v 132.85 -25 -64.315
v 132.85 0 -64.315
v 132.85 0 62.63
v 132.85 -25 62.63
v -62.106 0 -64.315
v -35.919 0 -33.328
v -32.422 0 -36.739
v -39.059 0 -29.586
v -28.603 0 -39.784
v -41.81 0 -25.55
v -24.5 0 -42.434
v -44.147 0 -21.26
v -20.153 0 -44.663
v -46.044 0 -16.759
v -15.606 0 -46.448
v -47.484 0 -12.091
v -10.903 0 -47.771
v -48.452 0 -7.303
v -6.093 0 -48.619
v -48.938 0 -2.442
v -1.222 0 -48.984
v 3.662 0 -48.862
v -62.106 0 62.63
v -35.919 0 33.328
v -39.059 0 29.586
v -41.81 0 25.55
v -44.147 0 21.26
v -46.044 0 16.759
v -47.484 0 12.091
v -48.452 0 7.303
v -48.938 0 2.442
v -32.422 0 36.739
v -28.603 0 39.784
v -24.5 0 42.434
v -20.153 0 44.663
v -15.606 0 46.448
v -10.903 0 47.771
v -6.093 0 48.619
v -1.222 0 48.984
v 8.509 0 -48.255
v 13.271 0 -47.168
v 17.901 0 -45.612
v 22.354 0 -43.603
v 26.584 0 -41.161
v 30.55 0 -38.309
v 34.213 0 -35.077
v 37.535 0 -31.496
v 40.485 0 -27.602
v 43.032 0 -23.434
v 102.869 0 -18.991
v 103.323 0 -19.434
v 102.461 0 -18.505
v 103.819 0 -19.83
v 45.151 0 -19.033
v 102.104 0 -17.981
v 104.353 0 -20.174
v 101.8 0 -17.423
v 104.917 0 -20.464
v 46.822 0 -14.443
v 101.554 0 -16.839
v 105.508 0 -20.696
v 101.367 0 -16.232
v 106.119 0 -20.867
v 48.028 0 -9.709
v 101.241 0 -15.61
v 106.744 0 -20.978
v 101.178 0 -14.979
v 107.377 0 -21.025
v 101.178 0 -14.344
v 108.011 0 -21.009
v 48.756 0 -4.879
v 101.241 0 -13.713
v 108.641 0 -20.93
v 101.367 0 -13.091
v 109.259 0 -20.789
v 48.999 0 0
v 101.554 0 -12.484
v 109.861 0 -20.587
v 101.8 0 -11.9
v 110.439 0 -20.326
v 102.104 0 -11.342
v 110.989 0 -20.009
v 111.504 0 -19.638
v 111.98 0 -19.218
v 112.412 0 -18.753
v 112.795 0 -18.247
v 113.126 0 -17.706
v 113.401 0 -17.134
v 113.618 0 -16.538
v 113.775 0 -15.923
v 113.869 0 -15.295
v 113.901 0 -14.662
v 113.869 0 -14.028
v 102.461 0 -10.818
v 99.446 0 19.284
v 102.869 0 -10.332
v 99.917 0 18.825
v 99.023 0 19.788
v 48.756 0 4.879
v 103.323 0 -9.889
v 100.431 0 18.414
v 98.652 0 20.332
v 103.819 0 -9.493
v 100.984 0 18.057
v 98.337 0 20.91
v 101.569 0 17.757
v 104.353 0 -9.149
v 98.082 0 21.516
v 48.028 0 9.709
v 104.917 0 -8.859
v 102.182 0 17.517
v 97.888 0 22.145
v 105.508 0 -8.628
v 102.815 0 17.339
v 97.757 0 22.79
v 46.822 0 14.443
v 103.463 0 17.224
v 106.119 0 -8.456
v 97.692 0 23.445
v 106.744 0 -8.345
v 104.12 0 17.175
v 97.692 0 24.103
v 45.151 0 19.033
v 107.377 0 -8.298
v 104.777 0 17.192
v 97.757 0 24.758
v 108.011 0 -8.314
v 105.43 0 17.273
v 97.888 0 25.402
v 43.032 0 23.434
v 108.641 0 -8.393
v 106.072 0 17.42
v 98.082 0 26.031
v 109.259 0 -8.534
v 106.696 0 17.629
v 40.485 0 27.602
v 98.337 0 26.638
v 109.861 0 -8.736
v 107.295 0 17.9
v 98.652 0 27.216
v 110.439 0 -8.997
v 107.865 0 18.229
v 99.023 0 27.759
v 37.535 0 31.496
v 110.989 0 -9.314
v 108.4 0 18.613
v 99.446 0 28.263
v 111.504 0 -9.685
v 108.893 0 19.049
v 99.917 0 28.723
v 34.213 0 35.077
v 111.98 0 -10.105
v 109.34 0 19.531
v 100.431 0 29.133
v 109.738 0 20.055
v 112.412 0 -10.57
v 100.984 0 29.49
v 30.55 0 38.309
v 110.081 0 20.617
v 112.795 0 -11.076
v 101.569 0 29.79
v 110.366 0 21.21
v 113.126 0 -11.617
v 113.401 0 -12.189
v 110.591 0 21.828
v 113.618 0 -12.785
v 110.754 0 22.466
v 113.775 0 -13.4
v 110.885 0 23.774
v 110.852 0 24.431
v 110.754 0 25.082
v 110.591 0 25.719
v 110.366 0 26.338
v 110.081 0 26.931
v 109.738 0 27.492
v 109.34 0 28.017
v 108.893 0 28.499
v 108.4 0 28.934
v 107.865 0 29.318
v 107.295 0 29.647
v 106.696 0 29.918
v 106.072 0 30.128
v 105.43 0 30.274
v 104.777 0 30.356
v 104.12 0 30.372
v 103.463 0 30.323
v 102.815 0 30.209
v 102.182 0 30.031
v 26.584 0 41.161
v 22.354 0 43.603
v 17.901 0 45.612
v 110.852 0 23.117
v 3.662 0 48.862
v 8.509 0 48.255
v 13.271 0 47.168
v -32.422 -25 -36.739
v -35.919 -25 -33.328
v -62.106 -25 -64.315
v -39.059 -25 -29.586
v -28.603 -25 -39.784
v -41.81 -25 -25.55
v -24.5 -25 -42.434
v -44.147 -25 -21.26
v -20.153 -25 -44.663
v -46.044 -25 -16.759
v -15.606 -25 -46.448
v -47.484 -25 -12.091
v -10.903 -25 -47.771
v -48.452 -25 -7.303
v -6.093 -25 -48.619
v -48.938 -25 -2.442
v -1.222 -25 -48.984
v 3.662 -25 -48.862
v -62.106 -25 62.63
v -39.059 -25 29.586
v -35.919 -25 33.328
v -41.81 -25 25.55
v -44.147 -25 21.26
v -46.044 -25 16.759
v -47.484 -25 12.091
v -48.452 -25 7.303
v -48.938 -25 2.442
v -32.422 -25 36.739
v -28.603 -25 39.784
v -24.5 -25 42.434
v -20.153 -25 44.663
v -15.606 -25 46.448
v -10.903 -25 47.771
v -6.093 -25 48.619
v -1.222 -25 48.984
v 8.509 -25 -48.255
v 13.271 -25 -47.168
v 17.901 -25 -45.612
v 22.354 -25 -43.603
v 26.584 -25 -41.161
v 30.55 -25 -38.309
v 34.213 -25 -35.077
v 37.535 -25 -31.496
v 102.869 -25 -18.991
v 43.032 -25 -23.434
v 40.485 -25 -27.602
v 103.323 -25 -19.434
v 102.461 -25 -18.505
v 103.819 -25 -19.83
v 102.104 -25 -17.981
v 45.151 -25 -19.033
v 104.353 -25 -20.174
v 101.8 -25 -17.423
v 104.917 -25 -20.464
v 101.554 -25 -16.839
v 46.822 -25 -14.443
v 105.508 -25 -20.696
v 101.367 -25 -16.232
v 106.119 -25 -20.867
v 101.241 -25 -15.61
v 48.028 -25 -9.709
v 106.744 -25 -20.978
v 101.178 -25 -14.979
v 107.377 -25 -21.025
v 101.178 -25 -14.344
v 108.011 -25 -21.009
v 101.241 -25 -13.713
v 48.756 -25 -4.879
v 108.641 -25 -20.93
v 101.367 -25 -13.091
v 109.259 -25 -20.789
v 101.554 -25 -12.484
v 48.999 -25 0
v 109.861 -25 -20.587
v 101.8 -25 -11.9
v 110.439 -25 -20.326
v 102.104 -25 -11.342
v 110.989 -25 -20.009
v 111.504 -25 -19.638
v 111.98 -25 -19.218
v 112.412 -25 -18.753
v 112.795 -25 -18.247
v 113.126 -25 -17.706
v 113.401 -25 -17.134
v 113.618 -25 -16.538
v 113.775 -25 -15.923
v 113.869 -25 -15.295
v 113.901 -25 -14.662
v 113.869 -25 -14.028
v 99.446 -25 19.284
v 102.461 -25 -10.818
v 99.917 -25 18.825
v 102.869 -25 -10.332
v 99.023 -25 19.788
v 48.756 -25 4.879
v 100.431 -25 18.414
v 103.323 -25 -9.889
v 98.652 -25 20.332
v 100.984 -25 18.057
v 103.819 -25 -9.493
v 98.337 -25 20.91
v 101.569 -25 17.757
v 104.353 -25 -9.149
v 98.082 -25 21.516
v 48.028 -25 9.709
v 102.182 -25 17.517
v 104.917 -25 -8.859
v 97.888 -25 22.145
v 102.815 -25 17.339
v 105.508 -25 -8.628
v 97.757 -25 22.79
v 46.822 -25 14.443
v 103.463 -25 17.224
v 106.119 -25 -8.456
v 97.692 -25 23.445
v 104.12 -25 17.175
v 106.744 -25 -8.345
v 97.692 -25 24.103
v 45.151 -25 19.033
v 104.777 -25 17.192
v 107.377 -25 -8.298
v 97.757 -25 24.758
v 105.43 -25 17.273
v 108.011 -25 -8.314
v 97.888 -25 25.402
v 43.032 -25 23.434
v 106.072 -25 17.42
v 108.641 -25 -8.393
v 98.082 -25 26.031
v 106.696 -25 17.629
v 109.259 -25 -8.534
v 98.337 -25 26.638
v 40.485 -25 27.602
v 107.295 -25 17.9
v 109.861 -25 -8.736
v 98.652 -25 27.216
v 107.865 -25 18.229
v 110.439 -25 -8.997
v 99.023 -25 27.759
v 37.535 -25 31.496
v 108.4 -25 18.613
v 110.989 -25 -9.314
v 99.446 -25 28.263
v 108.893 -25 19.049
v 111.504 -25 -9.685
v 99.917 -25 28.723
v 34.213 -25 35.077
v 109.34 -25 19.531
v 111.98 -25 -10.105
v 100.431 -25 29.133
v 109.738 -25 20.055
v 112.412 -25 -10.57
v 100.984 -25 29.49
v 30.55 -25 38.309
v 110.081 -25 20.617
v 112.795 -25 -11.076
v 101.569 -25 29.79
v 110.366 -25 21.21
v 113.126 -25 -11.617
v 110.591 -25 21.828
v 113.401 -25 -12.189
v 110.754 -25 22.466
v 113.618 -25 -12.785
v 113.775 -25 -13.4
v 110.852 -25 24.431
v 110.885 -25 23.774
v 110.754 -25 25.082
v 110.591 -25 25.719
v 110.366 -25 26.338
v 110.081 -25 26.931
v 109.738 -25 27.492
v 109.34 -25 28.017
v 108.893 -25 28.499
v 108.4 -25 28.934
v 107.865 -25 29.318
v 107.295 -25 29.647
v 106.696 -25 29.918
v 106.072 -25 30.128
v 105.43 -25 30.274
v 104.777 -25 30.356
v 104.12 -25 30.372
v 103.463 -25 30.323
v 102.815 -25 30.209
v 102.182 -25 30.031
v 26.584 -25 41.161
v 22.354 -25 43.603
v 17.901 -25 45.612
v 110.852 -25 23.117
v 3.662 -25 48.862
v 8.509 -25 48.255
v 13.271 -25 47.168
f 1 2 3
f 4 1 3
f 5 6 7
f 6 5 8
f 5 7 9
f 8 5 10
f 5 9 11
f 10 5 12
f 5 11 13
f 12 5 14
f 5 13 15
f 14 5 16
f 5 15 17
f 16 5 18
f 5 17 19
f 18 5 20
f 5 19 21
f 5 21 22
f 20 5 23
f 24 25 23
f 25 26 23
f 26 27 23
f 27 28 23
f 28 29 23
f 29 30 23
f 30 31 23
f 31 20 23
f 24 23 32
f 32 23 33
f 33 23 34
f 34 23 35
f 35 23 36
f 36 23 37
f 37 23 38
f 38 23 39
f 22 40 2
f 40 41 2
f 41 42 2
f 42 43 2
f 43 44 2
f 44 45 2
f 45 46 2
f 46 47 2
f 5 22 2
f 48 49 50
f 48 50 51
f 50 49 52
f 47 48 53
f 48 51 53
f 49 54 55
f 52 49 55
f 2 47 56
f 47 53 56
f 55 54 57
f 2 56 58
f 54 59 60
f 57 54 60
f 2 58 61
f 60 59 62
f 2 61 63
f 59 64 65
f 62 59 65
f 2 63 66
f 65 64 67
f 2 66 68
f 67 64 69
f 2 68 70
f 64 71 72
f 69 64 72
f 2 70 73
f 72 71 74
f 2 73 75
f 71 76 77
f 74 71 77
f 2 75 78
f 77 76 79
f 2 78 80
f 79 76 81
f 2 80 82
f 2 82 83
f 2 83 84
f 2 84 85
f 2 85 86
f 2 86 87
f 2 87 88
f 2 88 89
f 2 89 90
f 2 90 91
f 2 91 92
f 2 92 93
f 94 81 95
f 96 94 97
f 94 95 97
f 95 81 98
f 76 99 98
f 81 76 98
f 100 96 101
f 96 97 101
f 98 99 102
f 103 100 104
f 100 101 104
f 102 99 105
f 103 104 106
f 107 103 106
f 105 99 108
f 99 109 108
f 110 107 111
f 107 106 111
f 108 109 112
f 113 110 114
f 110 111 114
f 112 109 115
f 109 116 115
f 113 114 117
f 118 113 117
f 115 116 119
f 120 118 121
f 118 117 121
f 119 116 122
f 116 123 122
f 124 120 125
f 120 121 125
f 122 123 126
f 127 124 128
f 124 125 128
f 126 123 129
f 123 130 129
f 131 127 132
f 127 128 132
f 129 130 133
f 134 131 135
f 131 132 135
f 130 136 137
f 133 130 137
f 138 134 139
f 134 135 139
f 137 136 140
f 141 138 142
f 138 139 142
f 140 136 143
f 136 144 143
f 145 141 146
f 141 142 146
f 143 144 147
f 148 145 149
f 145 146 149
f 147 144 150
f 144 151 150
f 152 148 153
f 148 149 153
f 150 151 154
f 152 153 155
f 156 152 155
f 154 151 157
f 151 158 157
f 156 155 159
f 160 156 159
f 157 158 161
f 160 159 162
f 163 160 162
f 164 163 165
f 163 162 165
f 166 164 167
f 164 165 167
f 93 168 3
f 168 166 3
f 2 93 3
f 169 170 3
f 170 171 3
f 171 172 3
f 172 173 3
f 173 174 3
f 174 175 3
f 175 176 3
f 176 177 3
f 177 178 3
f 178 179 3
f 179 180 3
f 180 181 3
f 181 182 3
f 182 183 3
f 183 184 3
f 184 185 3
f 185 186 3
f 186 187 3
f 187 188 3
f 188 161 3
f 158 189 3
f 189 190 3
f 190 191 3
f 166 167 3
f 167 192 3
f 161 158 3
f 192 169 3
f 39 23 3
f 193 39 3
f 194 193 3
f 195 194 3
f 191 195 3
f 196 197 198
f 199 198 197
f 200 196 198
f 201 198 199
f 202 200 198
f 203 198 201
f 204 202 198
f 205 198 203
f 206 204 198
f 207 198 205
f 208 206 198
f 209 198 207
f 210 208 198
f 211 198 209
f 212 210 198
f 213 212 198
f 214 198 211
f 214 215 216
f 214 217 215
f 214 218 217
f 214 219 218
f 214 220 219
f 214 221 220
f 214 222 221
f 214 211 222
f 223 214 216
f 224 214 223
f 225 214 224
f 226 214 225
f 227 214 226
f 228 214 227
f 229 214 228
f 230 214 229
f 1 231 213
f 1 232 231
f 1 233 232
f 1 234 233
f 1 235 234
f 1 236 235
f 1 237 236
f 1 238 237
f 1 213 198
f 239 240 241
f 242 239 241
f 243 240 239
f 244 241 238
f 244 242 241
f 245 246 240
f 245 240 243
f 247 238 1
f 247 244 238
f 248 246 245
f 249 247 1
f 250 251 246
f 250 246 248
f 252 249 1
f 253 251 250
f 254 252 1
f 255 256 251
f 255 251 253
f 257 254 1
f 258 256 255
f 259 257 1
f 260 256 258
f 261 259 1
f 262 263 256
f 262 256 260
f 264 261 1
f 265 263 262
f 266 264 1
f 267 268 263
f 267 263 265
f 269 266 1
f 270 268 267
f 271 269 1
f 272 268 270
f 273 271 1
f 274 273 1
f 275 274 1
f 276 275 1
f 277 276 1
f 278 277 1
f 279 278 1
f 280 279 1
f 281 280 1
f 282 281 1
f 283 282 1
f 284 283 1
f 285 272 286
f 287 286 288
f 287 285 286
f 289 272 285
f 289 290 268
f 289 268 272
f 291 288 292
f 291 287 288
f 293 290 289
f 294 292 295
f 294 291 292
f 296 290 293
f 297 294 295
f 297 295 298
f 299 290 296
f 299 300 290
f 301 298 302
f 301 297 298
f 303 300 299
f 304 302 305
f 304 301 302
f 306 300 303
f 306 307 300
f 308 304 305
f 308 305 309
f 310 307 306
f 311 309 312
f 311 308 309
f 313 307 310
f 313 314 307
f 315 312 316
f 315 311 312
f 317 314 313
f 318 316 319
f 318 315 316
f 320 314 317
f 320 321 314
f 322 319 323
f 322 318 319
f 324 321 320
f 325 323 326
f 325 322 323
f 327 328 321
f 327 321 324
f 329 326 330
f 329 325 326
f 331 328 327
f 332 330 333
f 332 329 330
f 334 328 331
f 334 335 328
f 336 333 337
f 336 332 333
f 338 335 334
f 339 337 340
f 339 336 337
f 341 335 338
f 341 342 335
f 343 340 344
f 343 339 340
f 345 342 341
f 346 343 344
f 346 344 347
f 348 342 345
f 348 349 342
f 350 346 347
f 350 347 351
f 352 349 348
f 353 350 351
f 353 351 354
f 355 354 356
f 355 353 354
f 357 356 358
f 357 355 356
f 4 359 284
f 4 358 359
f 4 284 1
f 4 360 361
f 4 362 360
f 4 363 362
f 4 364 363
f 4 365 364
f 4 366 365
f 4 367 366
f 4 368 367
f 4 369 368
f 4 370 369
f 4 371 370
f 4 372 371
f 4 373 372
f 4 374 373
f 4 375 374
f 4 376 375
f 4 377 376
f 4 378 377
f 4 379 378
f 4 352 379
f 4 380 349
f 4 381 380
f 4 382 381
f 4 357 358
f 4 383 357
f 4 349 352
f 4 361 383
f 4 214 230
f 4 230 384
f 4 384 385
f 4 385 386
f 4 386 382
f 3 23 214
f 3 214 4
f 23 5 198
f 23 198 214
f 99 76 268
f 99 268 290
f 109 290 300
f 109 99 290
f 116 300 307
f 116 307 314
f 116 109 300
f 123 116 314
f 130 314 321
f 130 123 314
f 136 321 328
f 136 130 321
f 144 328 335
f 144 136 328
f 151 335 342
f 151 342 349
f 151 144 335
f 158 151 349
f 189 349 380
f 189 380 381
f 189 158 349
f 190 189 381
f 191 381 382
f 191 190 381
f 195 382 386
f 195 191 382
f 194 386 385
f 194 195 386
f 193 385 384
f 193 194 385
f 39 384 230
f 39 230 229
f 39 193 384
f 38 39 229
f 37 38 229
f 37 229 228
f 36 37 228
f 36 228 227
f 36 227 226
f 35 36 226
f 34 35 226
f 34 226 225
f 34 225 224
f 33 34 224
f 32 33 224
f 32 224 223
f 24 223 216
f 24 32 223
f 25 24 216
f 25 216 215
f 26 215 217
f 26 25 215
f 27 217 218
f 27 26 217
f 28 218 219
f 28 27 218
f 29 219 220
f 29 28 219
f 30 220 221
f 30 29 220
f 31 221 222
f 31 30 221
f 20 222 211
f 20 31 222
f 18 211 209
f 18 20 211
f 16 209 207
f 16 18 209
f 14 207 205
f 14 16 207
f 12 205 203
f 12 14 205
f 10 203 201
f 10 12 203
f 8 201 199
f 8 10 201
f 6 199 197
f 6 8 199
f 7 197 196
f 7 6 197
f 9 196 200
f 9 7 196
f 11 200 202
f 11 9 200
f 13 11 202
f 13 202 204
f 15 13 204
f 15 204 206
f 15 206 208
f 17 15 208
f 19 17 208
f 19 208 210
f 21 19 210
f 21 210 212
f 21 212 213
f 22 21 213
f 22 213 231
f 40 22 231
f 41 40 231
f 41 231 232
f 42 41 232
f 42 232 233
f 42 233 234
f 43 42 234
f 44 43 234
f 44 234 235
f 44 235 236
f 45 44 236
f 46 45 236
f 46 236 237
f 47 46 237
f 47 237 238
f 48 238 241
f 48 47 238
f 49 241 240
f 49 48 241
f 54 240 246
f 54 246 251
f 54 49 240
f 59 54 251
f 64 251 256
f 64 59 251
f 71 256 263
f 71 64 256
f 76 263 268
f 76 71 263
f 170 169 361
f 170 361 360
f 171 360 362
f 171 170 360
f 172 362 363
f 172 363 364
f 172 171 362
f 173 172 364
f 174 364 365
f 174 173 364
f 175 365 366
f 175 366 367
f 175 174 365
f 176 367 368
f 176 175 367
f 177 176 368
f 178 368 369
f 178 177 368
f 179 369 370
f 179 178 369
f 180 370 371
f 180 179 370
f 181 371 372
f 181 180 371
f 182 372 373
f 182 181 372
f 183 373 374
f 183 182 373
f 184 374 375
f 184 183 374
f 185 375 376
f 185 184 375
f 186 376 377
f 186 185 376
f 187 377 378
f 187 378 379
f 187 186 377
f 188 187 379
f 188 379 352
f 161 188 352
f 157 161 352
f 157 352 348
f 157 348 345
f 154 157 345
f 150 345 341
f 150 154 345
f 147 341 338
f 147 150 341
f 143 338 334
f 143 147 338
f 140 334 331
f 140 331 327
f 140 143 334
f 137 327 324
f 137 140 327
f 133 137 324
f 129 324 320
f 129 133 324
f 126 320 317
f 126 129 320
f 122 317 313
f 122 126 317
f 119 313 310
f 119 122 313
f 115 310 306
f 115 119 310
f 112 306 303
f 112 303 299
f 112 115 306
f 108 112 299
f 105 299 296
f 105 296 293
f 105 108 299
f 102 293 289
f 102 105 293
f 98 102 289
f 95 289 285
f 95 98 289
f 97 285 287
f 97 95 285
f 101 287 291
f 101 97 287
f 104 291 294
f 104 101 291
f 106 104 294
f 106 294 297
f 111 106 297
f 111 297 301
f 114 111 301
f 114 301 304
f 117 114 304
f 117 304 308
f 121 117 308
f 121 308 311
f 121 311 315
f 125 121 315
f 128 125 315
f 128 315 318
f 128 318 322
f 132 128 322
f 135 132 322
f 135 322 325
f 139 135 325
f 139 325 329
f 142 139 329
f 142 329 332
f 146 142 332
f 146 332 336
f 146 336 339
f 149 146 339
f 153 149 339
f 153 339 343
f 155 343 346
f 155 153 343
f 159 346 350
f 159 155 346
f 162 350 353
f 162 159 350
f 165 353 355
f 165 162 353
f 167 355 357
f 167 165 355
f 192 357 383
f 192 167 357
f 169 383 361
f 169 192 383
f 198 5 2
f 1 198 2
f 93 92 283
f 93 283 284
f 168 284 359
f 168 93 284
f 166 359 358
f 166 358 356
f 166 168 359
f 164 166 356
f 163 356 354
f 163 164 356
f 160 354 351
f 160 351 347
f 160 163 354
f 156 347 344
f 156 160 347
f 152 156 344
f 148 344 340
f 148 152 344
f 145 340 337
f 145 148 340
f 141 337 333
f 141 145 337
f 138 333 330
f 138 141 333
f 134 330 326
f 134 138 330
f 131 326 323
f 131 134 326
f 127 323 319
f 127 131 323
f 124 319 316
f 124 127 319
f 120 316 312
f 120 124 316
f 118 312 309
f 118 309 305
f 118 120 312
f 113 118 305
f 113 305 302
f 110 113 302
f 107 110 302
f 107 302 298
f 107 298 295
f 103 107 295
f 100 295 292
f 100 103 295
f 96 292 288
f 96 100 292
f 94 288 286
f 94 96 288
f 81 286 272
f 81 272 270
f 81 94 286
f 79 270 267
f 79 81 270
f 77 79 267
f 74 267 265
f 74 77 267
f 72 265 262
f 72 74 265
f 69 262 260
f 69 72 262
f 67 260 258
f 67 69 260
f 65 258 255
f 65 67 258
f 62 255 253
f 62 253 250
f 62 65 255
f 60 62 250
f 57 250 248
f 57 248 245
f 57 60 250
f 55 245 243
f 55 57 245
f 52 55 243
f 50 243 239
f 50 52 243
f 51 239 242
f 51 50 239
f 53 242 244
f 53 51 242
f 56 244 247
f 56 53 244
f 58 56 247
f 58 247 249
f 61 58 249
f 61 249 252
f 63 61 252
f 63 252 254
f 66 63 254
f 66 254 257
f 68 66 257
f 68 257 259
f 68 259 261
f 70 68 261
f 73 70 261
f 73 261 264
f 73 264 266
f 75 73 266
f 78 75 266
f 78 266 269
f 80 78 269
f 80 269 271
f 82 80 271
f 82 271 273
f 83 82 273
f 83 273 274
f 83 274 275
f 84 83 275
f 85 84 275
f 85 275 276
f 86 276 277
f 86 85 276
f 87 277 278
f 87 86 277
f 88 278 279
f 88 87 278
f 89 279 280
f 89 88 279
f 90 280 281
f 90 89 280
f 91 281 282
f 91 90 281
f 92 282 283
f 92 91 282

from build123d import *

# Parameters (mm, degrees)
F0_W     = 194.955856
F0_H     = 126.944736
F0_R     = 6.365504
F0_R_2   = 48.999093
F0_R_3   = 6.600609
F1_DEPTH = 25


with BuildPart() as f1:
    # F0 (on Front) → F1 (new body)
    with BuildSketch(Plane.XZ):
        with Locations((35.371989, -0.842303)):
            Rectangle(F0_W, F0_H)
        with Locations((107.535303, -14.661582)):
            Circle(F0_R, mode=Mode.SUBTRACT)
        Circle(F0_R_2, mode=Mode.SUBTRACT)
        with Locations((104.284093, 23.773747)):
            Circle(F0_R_3, mode=Mode.SUBTRACT)
    extrude(amount=F1_DEPTH)


solid = f1.part
